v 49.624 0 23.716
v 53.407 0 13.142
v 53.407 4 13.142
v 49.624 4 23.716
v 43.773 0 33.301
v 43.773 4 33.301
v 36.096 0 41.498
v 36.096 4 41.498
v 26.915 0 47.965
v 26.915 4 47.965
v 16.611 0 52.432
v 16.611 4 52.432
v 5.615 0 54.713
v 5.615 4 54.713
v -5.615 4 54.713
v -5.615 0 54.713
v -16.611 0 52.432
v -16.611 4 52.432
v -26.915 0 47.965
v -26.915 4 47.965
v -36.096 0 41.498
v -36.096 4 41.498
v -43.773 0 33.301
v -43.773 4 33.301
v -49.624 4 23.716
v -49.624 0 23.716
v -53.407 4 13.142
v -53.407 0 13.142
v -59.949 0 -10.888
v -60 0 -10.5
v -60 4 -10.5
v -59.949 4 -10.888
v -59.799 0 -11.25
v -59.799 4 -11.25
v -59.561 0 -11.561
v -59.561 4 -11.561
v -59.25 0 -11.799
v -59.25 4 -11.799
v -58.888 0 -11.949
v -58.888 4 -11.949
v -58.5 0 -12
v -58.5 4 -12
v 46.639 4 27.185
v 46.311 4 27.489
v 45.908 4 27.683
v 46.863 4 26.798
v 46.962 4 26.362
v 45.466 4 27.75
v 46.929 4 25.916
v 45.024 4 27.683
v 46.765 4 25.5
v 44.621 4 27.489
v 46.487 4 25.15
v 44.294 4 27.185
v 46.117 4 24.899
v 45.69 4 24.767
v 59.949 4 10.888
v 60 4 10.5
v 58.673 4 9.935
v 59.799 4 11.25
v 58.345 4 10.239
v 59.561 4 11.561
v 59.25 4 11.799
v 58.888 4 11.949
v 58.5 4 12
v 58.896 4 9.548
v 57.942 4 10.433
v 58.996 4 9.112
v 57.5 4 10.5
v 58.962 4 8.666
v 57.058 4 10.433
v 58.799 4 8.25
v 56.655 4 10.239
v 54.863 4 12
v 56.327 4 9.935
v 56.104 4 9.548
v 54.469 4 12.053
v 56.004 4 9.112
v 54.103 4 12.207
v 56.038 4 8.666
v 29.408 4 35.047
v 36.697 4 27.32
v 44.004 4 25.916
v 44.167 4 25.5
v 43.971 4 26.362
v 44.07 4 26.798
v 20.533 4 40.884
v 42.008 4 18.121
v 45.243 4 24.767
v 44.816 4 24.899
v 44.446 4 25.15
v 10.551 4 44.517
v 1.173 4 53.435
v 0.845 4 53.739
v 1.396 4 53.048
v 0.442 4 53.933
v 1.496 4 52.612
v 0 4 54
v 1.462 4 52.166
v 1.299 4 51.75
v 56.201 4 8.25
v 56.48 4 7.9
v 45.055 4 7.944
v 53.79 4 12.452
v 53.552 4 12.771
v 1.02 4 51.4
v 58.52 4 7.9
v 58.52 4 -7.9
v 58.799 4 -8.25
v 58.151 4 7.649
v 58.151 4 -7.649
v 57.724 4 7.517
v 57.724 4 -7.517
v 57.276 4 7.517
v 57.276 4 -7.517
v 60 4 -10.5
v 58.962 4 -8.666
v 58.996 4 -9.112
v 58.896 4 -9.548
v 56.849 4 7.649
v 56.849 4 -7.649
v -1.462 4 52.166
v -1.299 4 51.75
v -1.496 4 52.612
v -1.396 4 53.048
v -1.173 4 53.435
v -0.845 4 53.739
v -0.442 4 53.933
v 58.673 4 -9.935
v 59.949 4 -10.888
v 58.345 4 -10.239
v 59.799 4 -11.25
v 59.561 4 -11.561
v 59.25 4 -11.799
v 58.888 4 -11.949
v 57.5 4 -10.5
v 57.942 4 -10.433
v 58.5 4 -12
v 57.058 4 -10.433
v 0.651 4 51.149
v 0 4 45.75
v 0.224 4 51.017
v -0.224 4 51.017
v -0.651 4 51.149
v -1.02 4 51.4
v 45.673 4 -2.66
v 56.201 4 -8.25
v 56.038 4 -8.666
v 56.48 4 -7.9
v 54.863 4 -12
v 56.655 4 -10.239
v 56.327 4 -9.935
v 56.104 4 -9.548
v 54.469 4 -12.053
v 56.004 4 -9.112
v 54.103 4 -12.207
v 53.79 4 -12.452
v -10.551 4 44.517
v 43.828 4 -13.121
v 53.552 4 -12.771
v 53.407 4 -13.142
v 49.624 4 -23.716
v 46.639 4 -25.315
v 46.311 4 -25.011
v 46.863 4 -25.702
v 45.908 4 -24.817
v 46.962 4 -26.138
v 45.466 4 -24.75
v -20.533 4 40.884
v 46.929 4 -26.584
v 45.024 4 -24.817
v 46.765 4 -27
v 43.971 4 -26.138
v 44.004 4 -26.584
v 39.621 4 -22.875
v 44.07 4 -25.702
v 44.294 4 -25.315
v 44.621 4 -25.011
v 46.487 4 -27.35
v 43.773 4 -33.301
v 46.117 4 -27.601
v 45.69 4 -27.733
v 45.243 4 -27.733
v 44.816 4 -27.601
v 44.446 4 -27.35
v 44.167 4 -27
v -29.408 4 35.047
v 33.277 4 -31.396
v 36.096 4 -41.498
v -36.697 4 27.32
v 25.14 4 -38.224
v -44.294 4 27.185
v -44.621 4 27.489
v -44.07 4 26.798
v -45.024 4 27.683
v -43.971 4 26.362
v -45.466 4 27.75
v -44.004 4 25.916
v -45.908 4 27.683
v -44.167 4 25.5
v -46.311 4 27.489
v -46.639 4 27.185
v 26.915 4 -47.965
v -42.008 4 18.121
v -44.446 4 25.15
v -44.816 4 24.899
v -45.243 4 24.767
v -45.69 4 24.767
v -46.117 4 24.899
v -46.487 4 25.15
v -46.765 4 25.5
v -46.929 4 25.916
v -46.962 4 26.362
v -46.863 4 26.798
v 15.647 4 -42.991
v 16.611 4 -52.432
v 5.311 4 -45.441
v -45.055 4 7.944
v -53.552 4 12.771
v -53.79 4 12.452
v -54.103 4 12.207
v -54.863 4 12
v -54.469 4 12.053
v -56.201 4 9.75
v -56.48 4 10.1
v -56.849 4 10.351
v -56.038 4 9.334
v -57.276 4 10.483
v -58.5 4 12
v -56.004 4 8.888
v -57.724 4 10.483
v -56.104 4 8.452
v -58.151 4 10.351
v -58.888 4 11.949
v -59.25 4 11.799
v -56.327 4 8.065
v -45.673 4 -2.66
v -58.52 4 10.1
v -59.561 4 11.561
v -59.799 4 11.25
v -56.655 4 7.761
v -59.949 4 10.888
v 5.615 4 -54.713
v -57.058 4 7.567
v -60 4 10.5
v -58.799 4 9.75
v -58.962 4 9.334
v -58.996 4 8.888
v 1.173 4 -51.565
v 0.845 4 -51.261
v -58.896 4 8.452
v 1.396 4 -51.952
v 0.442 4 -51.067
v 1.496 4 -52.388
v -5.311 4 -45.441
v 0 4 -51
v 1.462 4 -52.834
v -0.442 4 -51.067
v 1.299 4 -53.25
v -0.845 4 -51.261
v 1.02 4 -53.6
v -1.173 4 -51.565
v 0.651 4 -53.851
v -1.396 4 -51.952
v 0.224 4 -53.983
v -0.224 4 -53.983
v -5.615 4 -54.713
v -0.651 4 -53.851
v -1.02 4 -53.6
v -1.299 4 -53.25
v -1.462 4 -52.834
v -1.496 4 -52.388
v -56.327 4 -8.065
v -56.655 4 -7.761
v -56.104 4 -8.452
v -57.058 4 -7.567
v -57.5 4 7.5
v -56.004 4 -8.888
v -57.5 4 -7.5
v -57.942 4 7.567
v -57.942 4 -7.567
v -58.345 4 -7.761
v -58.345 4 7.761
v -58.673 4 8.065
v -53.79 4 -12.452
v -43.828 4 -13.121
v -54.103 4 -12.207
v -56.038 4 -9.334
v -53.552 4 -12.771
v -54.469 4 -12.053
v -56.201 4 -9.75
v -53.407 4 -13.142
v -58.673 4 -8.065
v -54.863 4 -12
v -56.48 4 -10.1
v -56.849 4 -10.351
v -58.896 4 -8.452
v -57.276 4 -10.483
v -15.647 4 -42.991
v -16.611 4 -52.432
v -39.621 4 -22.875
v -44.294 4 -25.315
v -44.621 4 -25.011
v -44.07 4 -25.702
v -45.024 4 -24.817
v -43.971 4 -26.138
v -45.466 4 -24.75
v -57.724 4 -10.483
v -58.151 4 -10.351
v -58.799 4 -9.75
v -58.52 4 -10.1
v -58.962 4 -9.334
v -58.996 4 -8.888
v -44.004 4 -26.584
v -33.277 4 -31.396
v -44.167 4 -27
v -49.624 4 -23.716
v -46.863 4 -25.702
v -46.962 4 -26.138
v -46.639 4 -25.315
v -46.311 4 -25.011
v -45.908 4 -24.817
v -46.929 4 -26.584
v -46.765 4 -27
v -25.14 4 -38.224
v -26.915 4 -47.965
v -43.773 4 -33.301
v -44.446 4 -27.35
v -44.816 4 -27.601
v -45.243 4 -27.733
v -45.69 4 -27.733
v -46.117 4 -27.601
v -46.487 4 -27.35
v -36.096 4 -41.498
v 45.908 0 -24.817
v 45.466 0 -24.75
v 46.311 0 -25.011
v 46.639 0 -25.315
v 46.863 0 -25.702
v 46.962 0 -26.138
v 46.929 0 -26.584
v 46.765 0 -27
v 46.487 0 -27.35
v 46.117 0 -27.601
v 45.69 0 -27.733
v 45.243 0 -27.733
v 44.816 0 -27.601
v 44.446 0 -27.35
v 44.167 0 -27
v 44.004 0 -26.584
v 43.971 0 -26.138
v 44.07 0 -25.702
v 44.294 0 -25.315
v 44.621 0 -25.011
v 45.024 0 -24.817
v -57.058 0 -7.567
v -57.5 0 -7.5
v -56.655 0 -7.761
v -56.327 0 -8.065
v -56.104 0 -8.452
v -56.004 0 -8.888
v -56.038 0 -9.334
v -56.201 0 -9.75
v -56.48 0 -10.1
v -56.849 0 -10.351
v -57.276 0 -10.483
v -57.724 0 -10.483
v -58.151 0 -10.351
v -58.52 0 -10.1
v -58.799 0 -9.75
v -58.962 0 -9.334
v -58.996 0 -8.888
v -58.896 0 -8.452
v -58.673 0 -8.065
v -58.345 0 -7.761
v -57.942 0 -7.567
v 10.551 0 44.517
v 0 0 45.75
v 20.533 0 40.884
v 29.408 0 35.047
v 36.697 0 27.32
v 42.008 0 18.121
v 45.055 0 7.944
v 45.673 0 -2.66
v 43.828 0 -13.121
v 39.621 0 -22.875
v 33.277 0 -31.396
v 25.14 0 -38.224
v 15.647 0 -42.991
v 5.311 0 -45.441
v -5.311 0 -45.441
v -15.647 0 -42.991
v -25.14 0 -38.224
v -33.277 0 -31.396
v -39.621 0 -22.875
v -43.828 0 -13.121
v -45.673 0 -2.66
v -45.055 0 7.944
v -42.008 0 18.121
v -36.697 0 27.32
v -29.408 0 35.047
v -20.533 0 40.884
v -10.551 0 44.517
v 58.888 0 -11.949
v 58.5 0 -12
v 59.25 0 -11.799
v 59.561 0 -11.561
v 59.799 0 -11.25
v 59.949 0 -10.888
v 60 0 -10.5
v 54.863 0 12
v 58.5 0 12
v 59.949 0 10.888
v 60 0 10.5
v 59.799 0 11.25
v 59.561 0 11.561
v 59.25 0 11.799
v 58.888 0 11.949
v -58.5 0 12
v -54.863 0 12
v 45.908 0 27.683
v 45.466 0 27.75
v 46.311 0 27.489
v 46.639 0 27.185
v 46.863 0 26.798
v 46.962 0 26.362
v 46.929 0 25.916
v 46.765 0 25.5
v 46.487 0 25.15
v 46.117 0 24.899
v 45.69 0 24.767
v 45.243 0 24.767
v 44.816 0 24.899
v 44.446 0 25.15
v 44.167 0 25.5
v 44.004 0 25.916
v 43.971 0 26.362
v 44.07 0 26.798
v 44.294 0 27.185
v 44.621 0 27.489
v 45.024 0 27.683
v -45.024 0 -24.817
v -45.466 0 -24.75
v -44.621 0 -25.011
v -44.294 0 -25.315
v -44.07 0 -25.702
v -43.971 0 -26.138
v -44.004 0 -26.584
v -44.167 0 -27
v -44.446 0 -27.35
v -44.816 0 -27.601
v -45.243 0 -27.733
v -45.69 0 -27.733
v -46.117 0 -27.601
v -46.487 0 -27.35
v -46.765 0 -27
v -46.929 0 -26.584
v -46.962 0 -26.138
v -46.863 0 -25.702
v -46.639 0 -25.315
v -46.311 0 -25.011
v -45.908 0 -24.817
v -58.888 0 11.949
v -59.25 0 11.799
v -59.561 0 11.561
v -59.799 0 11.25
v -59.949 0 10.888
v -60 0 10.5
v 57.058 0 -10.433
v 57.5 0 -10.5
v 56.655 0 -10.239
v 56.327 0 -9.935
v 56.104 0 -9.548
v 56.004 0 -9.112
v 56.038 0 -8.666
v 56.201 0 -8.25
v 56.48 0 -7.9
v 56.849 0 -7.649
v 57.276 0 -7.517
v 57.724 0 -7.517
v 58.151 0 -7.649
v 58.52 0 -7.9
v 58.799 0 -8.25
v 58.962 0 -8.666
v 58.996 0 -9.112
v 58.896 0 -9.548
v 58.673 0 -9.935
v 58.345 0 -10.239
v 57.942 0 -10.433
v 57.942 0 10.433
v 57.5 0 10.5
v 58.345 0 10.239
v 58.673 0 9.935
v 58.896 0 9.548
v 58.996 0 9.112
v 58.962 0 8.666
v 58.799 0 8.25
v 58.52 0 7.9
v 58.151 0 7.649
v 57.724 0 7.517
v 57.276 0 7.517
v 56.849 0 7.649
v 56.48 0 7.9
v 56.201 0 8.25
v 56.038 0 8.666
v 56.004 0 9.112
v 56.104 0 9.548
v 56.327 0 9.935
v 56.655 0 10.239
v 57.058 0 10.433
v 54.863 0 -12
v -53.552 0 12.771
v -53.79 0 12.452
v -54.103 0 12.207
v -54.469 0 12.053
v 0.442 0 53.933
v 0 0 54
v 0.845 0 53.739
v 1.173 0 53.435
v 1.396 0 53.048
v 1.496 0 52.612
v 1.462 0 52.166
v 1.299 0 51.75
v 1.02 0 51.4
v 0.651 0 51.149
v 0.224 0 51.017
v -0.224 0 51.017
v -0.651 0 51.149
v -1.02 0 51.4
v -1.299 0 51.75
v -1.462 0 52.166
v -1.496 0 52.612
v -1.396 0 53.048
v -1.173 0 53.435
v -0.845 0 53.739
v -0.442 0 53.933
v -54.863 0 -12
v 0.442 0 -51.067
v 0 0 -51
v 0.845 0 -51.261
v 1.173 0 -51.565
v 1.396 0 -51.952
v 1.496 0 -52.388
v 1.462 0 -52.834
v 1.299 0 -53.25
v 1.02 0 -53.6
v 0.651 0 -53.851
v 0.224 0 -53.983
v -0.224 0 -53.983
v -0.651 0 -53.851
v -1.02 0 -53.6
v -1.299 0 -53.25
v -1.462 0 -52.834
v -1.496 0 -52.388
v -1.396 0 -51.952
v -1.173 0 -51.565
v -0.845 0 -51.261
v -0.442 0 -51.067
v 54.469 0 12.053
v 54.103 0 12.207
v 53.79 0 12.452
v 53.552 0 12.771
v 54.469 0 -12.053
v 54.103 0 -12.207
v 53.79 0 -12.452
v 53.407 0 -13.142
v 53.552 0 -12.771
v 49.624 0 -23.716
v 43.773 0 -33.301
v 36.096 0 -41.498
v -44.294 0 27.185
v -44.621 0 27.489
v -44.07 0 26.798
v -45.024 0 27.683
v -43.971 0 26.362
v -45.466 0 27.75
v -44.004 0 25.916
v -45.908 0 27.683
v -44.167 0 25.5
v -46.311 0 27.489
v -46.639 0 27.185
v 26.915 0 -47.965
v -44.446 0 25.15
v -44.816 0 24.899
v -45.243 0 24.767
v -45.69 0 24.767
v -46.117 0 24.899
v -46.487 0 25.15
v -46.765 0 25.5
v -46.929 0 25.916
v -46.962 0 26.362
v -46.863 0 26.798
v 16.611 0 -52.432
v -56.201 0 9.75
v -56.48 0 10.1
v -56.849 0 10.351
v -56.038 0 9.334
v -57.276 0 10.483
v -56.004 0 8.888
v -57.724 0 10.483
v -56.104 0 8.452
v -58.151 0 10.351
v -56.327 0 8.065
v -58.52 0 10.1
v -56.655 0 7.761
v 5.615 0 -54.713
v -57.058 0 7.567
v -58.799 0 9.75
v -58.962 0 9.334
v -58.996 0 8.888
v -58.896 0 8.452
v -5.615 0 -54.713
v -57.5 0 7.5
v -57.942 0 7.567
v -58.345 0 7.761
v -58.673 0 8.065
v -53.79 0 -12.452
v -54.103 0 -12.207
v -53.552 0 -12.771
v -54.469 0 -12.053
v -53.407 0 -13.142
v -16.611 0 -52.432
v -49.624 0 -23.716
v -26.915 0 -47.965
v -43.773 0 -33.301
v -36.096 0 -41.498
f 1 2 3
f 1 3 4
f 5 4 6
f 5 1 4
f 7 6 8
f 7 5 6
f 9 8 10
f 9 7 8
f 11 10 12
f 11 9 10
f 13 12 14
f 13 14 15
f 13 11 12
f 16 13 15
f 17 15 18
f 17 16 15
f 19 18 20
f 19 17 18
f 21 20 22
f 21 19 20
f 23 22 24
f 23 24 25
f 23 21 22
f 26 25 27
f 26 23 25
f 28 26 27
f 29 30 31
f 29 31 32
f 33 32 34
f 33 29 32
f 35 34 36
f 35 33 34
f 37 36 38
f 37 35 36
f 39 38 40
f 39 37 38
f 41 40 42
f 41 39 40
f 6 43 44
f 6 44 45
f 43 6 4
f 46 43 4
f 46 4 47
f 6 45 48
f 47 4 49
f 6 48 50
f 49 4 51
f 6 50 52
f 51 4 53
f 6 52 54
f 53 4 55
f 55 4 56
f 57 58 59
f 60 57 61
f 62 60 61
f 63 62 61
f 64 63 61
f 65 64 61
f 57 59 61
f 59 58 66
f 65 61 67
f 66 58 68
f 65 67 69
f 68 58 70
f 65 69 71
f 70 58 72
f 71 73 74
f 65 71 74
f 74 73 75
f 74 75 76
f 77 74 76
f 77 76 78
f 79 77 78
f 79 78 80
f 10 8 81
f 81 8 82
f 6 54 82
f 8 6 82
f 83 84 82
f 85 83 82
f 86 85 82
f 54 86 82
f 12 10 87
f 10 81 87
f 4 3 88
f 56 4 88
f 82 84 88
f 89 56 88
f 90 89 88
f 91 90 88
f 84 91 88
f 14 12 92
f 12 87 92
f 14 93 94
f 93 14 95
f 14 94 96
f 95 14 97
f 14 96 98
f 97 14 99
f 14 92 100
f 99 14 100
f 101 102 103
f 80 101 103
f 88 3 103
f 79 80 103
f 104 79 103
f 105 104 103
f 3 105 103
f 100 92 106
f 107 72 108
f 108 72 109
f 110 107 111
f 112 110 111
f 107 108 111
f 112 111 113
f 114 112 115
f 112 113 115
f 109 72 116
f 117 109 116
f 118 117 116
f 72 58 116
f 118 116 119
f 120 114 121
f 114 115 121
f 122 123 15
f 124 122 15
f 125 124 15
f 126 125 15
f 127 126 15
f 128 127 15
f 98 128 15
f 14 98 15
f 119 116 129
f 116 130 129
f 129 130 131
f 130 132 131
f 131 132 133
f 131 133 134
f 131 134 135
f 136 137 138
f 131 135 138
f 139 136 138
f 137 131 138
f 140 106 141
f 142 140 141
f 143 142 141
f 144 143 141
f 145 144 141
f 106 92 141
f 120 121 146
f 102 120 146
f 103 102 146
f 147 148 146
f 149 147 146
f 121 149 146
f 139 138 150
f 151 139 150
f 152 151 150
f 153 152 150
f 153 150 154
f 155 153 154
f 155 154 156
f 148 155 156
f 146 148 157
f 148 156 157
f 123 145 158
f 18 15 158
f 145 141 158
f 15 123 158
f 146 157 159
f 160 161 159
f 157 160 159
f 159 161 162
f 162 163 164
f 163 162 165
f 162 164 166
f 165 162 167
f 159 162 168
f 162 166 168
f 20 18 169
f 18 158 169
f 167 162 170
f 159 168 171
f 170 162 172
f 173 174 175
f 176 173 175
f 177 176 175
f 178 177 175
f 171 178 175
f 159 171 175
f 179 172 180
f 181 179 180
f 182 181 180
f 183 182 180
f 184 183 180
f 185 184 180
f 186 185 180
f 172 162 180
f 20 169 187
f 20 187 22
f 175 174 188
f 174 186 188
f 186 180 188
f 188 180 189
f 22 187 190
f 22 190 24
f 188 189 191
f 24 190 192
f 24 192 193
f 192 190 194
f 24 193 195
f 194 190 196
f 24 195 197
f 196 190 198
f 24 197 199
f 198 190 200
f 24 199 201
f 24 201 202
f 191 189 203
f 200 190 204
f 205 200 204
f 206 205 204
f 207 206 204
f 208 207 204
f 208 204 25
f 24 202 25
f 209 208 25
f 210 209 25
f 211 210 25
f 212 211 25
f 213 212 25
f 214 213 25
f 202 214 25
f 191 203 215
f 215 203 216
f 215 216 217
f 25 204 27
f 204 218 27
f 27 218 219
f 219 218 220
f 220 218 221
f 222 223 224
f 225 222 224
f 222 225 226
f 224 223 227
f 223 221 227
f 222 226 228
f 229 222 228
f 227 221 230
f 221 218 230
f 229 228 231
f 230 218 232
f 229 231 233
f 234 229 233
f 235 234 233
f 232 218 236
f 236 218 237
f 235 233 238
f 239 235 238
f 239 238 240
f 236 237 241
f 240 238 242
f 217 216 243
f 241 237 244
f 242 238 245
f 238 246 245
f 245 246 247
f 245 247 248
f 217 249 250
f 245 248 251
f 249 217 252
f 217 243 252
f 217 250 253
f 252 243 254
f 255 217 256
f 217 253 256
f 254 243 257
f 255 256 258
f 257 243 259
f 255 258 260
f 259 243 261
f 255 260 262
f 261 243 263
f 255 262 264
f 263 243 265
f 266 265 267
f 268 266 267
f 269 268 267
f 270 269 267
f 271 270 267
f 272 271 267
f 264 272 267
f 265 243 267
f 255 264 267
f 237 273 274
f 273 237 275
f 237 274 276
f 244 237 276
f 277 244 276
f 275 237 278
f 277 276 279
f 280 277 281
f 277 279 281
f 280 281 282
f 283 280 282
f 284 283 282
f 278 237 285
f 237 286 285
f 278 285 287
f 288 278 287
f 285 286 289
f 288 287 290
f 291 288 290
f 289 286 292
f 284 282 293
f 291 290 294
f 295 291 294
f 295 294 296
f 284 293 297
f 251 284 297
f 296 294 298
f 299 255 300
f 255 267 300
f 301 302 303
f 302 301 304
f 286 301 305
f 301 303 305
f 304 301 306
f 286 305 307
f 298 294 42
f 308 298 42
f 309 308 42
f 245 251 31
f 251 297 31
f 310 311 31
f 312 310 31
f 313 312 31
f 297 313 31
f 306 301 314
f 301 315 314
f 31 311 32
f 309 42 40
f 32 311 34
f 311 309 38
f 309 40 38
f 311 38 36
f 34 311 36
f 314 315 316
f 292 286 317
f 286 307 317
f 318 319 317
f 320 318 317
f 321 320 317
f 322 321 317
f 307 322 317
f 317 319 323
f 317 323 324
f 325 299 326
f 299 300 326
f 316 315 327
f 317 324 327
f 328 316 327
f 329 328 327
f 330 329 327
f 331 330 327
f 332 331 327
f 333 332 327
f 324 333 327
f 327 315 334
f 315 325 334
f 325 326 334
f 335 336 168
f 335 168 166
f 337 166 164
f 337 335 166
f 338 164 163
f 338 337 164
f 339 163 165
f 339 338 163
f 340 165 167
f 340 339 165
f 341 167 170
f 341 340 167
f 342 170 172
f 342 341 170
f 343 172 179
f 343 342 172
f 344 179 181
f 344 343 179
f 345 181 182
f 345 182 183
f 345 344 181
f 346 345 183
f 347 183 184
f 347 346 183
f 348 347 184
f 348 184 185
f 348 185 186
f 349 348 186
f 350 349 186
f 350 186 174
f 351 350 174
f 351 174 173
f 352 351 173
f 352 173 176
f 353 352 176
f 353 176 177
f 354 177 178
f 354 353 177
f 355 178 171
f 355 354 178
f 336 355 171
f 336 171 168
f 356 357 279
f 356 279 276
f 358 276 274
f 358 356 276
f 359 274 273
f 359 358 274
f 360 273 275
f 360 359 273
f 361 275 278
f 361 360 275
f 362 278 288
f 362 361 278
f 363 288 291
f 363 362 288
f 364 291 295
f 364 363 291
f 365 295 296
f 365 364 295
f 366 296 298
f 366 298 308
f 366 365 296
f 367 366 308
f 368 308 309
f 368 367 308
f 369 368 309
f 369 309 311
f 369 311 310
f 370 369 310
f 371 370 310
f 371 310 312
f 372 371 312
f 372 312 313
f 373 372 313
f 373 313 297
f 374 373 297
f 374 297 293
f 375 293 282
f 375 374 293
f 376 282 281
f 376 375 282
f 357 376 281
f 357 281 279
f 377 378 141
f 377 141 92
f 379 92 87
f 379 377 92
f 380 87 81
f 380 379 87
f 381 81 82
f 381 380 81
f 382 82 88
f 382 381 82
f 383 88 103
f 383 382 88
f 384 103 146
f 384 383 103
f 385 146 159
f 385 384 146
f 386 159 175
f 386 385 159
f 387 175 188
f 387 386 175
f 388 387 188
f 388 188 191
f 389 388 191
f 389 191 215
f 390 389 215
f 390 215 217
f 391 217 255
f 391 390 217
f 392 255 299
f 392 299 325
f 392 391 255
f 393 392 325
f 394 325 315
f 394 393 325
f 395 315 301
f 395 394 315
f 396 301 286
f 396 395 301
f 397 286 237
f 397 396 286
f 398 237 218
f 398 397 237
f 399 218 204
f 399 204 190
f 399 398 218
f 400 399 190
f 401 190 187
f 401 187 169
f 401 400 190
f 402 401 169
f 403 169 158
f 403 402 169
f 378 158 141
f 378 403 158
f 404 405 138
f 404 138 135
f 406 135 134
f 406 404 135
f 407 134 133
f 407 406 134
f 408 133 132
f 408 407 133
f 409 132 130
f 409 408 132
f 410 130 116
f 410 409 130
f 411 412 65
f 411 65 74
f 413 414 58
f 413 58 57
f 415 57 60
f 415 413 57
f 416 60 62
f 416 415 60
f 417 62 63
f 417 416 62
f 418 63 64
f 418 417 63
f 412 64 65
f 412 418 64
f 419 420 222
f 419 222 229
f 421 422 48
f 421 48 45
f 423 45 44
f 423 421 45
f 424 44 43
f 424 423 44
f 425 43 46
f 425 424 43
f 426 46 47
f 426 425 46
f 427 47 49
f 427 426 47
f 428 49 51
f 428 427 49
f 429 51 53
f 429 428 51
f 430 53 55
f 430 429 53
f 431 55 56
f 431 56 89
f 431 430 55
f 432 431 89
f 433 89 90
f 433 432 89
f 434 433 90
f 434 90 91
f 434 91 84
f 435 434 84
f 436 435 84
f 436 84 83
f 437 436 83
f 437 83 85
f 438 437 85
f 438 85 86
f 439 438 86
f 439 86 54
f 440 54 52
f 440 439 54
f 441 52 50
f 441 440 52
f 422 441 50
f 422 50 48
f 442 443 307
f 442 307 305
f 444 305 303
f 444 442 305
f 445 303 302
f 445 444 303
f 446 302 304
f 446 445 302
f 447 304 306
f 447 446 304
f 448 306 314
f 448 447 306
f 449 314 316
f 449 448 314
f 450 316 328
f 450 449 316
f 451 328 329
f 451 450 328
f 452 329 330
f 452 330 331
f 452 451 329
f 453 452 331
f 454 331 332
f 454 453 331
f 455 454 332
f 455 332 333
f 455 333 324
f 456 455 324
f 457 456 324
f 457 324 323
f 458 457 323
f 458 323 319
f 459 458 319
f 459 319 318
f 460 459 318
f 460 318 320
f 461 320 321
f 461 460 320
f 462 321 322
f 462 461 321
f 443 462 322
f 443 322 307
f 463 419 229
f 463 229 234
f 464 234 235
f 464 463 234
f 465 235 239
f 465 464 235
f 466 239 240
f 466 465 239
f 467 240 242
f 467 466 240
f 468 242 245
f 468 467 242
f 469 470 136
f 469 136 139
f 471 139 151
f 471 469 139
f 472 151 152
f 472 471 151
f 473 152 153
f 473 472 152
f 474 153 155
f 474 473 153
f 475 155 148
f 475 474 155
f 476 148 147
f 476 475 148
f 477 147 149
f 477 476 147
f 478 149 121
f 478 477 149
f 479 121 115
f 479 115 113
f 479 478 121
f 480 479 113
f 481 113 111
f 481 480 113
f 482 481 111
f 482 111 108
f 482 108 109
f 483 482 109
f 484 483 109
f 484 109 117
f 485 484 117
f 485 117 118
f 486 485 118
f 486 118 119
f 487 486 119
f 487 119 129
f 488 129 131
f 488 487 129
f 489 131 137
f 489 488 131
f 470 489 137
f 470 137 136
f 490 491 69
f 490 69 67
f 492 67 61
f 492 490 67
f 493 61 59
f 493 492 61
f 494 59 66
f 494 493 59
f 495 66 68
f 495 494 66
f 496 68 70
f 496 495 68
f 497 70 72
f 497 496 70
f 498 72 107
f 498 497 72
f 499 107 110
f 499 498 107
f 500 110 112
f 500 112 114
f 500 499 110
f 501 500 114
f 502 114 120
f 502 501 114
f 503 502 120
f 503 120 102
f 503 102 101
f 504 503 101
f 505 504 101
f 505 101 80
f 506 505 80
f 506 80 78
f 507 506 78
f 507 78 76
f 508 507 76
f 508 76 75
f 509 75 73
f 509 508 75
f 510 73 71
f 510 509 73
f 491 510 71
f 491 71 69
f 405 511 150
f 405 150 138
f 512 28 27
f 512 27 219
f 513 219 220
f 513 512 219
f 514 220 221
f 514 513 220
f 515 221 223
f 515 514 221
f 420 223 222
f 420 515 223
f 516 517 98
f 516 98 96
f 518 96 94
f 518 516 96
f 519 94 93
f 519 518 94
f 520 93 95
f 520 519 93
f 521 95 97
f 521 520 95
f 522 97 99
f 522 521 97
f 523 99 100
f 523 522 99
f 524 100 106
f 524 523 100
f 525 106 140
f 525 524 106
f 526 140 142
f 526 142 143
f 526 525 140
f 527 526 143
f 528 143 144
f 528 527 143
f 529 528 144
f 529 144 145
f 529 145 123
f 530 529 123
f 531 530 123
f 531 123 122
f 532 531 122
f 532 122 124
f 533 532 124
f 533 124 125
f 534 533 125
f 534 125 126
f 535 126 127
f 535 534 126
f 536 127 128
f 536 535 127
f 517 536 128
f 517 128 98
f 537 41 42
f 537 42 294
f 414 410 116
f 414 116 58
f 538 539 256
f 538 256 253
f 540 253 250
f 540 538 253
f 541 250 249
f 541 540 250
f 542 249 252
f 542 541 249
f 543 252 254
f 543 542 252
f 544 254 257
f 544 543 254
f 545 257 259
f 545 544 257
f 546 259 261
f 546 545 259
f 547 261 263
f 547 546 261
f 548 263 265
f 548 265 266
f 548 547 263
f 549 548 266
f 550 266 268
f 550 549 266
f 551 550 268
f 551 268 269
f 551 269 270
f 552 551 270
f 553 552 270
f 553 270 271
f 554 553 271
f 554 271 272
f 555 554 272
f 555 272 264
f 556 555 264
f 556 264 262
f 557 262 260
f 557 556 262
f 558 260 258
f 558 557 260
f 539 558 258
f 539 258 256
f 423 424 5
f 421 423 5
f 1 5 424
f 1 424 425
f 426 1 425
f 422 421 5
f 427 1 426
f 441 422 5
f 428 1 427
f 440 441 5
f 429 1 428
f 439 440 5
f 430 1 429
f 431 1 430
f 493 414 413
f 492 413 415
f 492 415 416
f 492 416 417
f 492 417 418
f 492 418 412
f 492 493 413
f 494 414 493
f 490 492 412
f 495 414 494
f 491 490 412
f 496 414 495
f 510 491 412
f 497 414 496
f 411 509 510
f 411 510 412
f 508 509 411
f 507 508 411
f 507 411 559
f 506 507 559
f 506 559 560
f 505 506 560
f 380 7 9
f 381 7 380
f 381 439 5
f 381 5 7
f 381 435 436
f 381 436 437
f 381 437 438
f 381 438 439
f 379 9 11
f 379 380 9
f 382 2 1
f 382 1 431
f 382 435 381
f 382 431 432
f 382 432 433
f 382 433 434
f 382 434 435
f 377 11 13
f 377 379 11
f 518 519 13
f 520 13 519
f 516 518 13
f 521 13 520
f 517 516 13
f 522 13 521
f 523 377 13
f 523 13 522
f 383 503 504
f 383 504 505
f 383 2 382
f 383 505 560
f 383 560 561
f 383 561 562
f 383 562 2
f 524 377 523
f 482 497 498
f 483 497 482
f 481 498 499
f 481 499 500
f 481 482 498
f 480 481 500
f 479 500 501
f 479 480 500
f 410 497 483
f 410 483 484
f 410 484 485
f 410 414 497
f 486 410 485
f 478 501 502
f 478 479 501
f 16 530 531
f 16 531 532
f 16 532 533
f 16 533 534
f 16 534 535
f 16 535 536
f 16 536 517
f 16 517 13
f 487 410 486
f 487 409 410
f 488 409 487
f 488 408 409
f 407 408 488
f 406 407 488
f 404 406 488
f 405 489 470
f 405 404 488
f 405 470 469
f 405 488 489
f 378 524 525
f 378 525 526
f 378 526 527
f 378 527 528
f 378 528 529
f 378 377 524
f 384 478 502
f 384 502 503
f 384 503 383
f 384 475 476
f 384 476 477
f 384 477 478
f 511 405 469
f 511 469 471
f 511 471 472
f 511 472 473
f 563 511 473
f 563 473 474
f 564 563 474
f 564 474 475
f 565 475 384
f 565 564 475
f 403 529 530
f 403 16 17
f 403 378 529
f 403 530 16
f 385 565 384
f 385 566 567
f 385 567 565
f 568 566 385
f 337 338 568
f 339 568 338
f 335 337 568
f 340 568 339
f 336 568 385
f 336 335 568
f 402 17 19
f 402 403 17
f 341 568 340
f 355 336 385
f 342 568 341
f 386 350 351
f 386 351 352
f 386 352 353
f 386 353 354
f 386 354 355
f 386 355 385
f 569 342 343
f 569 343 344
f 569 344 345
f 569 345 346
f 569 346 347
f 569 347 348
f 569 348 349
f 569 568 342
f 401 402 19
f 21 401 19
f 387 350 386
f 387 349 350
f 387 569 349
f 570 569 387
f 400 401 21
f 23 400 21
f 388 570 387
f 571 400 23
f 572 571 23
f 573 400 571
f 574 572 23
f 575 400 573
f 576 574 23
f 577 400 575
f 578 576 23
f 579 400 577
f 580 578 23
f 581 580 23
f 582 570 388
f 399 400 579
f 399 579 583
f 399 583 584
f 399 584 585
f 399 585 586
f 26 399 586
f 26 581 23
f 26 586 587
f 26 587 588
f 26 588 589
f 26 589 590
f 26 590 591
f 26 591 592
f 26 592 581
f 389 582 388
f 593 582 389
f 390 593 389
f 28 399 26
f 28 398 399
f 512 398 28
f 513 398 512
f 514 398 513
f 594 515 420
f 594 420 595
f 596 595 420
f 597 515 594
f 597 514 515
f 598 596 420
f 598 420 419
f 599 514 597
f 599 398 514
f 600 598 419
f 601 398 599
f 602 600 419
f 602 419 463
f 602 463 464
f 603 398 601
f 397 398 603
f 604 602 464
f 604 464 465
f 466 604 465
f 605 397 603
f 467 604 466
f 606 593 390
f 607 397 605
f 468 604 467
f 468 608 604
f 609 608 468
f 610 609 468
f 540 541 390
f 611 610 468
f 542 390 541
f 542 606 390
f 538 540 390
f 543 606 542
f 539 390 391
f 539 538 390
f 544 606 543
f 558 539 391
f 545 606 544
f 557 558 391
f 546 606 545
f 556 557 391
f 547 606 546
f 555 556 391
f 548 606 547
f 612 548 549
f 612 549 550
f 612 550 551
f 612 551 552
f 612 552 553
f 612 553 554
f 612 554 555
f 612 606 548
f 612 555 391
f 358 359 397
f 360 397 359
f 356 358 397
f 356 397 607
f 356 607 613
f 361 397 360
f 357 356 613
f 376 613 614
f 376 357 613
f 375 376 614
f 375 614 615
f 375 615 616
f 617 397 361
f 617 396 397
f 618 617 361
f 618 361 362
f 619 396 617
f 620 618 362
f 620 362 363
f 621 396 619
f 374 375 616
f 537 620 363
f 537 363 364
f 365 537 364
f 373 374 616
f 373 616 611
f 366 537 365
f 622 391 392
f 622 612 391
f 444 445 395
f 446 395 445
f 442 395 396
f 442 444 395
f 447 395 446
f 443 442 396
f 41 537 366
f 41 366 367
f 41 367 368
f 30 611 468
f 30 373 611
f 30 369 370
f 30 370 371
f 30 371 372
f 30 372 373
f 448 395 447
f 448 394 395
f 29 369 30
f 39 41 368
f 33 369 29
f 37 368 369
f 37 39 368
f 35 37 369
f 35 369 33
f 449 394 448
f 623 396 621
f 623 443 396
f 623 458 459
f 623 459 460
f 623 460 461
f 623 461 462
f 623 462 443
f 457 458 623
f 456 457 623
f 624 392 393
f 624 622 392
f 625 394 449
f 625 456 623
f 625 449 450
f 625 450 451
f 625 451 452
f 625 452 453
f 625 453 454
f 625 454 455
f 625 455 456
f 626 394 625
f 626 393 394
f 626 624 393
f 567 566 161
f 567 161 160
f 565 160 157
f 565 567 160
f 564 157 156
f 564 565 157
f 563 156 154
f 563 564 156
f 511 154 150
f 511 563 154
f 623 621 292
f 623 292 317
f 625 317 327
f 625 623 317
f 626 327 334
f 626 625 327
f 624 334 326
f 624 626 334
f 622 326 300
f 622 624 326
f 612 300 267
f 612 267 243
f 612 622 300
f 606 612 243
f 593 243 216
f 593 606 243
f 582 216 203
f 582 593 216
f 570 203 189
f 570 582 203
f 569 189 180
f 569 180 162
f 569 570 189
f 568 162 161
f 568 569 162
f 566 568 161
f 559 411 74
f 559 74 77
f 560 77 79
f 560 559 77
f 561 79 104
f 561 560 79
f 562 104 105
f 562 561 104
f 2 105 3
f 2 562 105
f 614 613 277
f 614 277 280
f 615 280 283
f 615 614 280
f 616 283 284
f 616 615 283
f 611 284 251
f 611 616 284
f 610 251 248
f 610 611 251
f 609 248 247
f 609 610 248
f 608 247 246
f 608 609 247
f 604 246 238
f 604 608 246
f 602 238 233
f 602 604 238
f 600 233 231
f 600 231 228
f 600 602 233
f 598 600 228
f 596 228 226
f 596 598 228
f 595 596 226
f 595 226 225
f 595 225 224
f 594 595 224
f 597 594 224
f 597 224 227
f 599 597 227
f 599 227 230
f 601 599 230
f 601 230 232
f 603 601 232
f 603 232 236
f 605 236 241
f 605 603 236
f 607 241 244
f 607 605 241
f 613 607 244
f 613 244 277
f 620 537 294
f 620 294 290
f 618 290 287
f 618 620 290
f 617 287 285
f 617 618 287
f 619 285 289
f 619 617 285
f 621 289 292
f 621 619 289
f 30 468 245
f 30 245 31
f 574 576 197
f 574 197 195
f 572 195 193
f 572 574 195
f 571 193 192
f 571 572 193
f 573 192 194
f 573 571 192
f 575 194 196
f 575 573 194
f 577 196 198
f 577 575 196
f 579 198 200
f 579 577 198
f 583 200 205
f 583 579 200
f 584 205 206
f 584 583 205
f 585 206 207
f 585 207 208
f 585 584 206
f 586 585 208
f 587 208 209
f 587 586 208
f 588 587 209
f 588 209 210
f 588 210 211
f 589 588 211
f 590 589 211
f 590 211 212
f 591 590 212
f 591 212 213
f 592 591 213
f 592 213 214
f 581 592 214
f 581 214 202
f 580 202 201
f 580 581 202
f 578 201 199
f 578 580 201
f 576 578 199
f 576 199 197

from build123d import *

# Parameters (mm, degrees)
SKETCH_1_R      = 45.75
SKETCH_1_R_2    = 1.5
EXTRUDE_1_DEPTH = 4


with BuildPart() as part:
    # 草图1 → 凸台-拉伸1 (new body)
    with BuildSketch(Plane(origin=(0, 0, 0), x_dir=(1, 0, 0), z_dir=(0, 1, 0))):
        with BuildLine():
            Line((-60, -10.5), (-60, 10.5))
            ThreePointArc((-60, 10.5), (-59.560660172, 11.560660172), (-58.5, 12))
            Line((-58.5, 12), (-54.863466897, 12))
            ThreePointArc((-54.863466897, 12), (-53.938159008, 12.31940468), (-53.406914679, 13.14159292))
            ThreePointArc((-53.406914679, 13.14159292), (0, 55), (53.406914679, 13.14159292))
            ThreePointArc((53.406914679, 13.14159292), (53.938159008, 12.31940468), (54.863466897, 12))
            Line((54.863466897, 12), (58.5, 12))
            ThreePointArc((58.5, 12), (59.560660172, 11.560660172), (60, 10.5))
            Line((60, 10.5), (60, -10.5))
            ThreePointArc((60, -10.5), (59.560660172, -11.560660172), (58.5, -12))
            Line((58.5, -12), (54.863466897, -12))
            ThreePointArc((54.863466897, -12), (53.938159008, -12.31940468), (53.406914679, -13.14159292))
            ThreePointArc((53.406914679, -13.14159292), (0, -55), (-53.406914679, -13.14159292))
            ThreePointArc((-53.406914679, -13.14159292), (-53.938159008, -12.31940468), (-54.863466897, -12))
            Line((-54.863466897, -12), (-58.5, -12))
            ThreePointArc((-58.5, -12), (-59.560660172, -11.560660172), (-60, -10.5))
        make_face()
        with Locations(Location((0, 0, 0), (0, 0, 270))):
            Circle(SKETCH_1_R, mode=Mode.SUBTRACT)
        with Locations(Location((0, 52.5, 0), (0, 0, 270))):
            Circle(SKETCH_1_R_2, mode=Mode.SUBTRACT)
        with Locations(Location((45.466333699, 26.25, 0), (0, 0, 270))):
            Circle(SKETCH_1_R_2, mode=Mode.SUBTRACT)
        with Locations(Location((45.466333699, -26.25, 0), (0, 0, 270))):
            Circle(SKETCH_1_R_2, mode=Mode.SUBTRACT)
        with Locations(Location((0, -52.5, 0), (0, 0, 270))):
            Circle(SKETCH_1_R_2, mode=Mode.SUBTRACT)
        with Locations(Location((-45.466333699, -26.25, 0), (0, 0, 270))):
            Circle(SKETCH_1_R_2, mode=Mode.SUBTRACT)
        with Locations(Location((-45.466333699, 26.25, 0), (0, 0, 270))):
            Circle(SKETCH_1_R_2, mode=Mode.SUBTRACT)
        with Locations(Location((-57.5, 9, 0), (0, 0, 270))):
            Circle(SKETCH_1_R_2, mode=Mode.SUBTRACT)
        with Locations(Location((57.5, 9, 0), (0, 0, 90))):
            Circle(SKETCH_1_R_2, mode=Mode.SUBTRACT)
        with Locations(Location((57.5, -9, 0), (0, 0, 270))):
            Circle(SKETCH_1_R_2, mode=Mode.SUBTRACT)
        with Locations(Location((-57.5, -9, 0), (0, 0, 90))):
            Circle(SKETCH_1_R_2, mode=Mode.SUBTRACT)
    extrude(amount=EXTRUDE_1_DEPTH)


solid = part.part
